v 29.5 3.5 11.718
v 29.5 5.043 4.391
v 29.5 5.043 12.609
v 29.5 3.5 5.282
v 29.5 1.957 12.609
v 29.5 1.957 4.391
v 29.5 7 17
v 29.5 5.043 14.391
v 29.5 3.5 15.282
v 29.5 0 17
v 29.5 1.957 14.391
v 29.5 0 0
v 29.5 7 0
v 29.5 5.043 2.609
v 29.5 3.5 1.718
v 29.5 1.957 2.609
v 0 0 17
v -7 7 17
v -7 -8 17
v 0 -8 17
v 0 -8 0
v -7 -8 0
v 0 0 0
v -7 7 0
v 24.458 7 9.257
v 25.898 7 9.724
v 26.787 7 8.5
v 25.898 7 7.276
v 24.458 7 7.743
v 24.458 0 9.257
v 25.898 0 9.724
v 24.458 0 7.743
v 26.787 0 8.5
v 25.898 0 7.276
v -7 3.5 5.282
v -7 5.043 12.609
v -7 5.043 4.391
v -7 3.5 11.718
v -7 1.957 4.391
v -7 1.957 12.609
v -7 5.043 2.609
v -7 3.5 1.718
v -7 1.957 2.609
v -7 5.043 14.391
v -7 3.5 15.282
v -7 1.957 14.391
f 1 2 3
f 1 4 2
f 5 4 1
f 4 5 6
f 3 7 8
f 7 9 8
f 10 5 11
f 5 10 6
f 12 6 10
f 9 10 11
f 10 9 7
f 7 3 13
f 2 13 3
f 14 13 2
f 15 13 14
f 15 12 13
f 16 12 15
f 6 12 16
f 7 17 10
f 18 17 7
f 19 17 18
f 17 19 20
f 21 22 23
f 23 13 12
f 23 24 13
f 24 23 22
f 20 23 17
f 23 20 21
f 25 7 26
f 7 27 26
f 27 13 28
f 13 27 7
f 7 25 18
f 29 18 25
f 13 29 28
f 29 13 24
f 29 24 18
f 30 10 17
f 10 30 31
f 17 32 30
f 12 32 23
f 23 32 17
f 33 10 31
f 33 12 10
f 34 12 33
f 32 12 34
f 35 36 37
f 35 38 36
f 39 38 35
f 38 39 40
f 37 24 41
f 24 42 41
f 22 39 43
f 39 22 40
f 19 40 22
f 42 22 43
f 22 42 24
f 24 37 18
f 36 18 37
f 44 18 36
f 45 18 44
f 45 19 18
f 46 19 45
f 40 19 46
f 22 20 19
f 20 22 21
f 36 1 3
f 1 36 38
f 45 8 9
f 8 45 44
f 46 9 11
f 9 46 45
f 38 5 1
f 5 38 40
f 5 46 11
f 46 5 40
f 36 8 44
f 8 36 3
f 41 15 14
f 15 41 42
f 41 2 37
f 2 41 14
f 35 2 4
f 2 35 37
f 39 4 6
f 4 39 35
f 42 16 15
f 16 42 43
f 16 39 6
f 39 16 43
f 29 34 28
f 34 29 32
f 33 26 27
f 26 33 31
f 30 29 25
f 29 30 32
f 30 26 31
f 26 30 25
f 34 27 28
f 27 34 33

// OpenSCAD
// file: extruder_configuration.scad
//pdiam based on Nophead's : http://hydraraptor.blogspot.com/2011/02/polyholes.html 
debug=0;

assemble= 0;
show_axles=0;

function pdiam(diam, tolerance=0.1)=debug?diam:(diam) / cos (180 / max(round(2 * diam),3))+tolerance;

//function pdiam(diam)=diam;

extruder_gear_D = 9;//12.6;
extruder_gear_length = 11;
filament_D = 1.75;

m3_D=3;
m8_D=8;

nema_size = 42;
nema_holes_distance = 31;
nema_axle_length = 24;
nema_axle_cutout_D = 23;

shaft_D = 5;

bearing625_D = 16.25;
bearing625_height=5;

bearing608_D	= 22;
bearing608_D_clr	= 24;
bearing608_width	= 7;
bearing608_clr	= bearing608_width+1;
bearing608_m8	= 14;

bearingLM8UU_height	= 23.75;
bearingLM8UU_D	= 15;
holder_LM8UU_D = 1;

thickness = 4;
depth = 18;
idler_depth = depth - 1;

echo( "Required M3 len : ");
echo( 2*thickness + depth + 4);

holder_offset_x = bearingLM8UU_D / 2 + thickness / 2;
holder_offset_y = -bearingLM8UU_D/2+ thickness / 2;

pneufit_D = 9.8;
pneufit_depth = 7;
filament_path_width = pneufit_D + 2;
filament_path_height = nema_size/4 + 2;
mo = 0.01;
da6 = 1/cos(180/6)/2;

idler_angle = 0;
idler_rotation_tolerance = 1;

hole_distance = (nema_size - nema_holes_distance) / 2; 
holes = 
[
	[hole_distance, hole_distance, -mo],
	[nema_size - hole_distance, hole_distance, -mo],
	[hole_distance, nema_size - hole_distance, -mo],
	//[nema_size - hole_distance, nema_size - hole_distance, -mo],
];

pillar_width = hole_distance*2;
pillar_offset = hole_distance - pillar_width / 2;
pillars = 
[
	[pillar_offset,pillar_offset,thickness-mo],
	[pillar_offset,nema_size - pillar_offset - pillar_width,thickness-mo],
];

holder_holes = [-5,5];
// main file
include<extruder_configuration.scad>

holder();

module holder()
{
	difference()
	{
		union()
		{
			cube([nema_size/2 + extruder_gear_D / 2 + thickness, m3_D + 4, idler_depth]);
			translate([-m3_D - 4,-15+ m3_D + 4,0])
			cube([m3_D + 4, 15, idler_depth]);
		}
		
		translate([nema_size/2 + extruder_gear_D / 2,10,idler_depth/2])
		rotate([90,0,0])
		cylinder(r=pdiam(filament_D)/2, h = 20);

		for (h = holder_holes) 
		{
			translate([-m3_D - 4-mo,(m3_D + 4)/2,idler_depth/2 - h])
			rotate([0,90,0])
			#cylinder(r=pdiam(m3_D)/2, h=nema_size/2 + extruder_gear_D / 2 + thickness+ m3_D + 4 + mo*2);
		}	
	}		
}
